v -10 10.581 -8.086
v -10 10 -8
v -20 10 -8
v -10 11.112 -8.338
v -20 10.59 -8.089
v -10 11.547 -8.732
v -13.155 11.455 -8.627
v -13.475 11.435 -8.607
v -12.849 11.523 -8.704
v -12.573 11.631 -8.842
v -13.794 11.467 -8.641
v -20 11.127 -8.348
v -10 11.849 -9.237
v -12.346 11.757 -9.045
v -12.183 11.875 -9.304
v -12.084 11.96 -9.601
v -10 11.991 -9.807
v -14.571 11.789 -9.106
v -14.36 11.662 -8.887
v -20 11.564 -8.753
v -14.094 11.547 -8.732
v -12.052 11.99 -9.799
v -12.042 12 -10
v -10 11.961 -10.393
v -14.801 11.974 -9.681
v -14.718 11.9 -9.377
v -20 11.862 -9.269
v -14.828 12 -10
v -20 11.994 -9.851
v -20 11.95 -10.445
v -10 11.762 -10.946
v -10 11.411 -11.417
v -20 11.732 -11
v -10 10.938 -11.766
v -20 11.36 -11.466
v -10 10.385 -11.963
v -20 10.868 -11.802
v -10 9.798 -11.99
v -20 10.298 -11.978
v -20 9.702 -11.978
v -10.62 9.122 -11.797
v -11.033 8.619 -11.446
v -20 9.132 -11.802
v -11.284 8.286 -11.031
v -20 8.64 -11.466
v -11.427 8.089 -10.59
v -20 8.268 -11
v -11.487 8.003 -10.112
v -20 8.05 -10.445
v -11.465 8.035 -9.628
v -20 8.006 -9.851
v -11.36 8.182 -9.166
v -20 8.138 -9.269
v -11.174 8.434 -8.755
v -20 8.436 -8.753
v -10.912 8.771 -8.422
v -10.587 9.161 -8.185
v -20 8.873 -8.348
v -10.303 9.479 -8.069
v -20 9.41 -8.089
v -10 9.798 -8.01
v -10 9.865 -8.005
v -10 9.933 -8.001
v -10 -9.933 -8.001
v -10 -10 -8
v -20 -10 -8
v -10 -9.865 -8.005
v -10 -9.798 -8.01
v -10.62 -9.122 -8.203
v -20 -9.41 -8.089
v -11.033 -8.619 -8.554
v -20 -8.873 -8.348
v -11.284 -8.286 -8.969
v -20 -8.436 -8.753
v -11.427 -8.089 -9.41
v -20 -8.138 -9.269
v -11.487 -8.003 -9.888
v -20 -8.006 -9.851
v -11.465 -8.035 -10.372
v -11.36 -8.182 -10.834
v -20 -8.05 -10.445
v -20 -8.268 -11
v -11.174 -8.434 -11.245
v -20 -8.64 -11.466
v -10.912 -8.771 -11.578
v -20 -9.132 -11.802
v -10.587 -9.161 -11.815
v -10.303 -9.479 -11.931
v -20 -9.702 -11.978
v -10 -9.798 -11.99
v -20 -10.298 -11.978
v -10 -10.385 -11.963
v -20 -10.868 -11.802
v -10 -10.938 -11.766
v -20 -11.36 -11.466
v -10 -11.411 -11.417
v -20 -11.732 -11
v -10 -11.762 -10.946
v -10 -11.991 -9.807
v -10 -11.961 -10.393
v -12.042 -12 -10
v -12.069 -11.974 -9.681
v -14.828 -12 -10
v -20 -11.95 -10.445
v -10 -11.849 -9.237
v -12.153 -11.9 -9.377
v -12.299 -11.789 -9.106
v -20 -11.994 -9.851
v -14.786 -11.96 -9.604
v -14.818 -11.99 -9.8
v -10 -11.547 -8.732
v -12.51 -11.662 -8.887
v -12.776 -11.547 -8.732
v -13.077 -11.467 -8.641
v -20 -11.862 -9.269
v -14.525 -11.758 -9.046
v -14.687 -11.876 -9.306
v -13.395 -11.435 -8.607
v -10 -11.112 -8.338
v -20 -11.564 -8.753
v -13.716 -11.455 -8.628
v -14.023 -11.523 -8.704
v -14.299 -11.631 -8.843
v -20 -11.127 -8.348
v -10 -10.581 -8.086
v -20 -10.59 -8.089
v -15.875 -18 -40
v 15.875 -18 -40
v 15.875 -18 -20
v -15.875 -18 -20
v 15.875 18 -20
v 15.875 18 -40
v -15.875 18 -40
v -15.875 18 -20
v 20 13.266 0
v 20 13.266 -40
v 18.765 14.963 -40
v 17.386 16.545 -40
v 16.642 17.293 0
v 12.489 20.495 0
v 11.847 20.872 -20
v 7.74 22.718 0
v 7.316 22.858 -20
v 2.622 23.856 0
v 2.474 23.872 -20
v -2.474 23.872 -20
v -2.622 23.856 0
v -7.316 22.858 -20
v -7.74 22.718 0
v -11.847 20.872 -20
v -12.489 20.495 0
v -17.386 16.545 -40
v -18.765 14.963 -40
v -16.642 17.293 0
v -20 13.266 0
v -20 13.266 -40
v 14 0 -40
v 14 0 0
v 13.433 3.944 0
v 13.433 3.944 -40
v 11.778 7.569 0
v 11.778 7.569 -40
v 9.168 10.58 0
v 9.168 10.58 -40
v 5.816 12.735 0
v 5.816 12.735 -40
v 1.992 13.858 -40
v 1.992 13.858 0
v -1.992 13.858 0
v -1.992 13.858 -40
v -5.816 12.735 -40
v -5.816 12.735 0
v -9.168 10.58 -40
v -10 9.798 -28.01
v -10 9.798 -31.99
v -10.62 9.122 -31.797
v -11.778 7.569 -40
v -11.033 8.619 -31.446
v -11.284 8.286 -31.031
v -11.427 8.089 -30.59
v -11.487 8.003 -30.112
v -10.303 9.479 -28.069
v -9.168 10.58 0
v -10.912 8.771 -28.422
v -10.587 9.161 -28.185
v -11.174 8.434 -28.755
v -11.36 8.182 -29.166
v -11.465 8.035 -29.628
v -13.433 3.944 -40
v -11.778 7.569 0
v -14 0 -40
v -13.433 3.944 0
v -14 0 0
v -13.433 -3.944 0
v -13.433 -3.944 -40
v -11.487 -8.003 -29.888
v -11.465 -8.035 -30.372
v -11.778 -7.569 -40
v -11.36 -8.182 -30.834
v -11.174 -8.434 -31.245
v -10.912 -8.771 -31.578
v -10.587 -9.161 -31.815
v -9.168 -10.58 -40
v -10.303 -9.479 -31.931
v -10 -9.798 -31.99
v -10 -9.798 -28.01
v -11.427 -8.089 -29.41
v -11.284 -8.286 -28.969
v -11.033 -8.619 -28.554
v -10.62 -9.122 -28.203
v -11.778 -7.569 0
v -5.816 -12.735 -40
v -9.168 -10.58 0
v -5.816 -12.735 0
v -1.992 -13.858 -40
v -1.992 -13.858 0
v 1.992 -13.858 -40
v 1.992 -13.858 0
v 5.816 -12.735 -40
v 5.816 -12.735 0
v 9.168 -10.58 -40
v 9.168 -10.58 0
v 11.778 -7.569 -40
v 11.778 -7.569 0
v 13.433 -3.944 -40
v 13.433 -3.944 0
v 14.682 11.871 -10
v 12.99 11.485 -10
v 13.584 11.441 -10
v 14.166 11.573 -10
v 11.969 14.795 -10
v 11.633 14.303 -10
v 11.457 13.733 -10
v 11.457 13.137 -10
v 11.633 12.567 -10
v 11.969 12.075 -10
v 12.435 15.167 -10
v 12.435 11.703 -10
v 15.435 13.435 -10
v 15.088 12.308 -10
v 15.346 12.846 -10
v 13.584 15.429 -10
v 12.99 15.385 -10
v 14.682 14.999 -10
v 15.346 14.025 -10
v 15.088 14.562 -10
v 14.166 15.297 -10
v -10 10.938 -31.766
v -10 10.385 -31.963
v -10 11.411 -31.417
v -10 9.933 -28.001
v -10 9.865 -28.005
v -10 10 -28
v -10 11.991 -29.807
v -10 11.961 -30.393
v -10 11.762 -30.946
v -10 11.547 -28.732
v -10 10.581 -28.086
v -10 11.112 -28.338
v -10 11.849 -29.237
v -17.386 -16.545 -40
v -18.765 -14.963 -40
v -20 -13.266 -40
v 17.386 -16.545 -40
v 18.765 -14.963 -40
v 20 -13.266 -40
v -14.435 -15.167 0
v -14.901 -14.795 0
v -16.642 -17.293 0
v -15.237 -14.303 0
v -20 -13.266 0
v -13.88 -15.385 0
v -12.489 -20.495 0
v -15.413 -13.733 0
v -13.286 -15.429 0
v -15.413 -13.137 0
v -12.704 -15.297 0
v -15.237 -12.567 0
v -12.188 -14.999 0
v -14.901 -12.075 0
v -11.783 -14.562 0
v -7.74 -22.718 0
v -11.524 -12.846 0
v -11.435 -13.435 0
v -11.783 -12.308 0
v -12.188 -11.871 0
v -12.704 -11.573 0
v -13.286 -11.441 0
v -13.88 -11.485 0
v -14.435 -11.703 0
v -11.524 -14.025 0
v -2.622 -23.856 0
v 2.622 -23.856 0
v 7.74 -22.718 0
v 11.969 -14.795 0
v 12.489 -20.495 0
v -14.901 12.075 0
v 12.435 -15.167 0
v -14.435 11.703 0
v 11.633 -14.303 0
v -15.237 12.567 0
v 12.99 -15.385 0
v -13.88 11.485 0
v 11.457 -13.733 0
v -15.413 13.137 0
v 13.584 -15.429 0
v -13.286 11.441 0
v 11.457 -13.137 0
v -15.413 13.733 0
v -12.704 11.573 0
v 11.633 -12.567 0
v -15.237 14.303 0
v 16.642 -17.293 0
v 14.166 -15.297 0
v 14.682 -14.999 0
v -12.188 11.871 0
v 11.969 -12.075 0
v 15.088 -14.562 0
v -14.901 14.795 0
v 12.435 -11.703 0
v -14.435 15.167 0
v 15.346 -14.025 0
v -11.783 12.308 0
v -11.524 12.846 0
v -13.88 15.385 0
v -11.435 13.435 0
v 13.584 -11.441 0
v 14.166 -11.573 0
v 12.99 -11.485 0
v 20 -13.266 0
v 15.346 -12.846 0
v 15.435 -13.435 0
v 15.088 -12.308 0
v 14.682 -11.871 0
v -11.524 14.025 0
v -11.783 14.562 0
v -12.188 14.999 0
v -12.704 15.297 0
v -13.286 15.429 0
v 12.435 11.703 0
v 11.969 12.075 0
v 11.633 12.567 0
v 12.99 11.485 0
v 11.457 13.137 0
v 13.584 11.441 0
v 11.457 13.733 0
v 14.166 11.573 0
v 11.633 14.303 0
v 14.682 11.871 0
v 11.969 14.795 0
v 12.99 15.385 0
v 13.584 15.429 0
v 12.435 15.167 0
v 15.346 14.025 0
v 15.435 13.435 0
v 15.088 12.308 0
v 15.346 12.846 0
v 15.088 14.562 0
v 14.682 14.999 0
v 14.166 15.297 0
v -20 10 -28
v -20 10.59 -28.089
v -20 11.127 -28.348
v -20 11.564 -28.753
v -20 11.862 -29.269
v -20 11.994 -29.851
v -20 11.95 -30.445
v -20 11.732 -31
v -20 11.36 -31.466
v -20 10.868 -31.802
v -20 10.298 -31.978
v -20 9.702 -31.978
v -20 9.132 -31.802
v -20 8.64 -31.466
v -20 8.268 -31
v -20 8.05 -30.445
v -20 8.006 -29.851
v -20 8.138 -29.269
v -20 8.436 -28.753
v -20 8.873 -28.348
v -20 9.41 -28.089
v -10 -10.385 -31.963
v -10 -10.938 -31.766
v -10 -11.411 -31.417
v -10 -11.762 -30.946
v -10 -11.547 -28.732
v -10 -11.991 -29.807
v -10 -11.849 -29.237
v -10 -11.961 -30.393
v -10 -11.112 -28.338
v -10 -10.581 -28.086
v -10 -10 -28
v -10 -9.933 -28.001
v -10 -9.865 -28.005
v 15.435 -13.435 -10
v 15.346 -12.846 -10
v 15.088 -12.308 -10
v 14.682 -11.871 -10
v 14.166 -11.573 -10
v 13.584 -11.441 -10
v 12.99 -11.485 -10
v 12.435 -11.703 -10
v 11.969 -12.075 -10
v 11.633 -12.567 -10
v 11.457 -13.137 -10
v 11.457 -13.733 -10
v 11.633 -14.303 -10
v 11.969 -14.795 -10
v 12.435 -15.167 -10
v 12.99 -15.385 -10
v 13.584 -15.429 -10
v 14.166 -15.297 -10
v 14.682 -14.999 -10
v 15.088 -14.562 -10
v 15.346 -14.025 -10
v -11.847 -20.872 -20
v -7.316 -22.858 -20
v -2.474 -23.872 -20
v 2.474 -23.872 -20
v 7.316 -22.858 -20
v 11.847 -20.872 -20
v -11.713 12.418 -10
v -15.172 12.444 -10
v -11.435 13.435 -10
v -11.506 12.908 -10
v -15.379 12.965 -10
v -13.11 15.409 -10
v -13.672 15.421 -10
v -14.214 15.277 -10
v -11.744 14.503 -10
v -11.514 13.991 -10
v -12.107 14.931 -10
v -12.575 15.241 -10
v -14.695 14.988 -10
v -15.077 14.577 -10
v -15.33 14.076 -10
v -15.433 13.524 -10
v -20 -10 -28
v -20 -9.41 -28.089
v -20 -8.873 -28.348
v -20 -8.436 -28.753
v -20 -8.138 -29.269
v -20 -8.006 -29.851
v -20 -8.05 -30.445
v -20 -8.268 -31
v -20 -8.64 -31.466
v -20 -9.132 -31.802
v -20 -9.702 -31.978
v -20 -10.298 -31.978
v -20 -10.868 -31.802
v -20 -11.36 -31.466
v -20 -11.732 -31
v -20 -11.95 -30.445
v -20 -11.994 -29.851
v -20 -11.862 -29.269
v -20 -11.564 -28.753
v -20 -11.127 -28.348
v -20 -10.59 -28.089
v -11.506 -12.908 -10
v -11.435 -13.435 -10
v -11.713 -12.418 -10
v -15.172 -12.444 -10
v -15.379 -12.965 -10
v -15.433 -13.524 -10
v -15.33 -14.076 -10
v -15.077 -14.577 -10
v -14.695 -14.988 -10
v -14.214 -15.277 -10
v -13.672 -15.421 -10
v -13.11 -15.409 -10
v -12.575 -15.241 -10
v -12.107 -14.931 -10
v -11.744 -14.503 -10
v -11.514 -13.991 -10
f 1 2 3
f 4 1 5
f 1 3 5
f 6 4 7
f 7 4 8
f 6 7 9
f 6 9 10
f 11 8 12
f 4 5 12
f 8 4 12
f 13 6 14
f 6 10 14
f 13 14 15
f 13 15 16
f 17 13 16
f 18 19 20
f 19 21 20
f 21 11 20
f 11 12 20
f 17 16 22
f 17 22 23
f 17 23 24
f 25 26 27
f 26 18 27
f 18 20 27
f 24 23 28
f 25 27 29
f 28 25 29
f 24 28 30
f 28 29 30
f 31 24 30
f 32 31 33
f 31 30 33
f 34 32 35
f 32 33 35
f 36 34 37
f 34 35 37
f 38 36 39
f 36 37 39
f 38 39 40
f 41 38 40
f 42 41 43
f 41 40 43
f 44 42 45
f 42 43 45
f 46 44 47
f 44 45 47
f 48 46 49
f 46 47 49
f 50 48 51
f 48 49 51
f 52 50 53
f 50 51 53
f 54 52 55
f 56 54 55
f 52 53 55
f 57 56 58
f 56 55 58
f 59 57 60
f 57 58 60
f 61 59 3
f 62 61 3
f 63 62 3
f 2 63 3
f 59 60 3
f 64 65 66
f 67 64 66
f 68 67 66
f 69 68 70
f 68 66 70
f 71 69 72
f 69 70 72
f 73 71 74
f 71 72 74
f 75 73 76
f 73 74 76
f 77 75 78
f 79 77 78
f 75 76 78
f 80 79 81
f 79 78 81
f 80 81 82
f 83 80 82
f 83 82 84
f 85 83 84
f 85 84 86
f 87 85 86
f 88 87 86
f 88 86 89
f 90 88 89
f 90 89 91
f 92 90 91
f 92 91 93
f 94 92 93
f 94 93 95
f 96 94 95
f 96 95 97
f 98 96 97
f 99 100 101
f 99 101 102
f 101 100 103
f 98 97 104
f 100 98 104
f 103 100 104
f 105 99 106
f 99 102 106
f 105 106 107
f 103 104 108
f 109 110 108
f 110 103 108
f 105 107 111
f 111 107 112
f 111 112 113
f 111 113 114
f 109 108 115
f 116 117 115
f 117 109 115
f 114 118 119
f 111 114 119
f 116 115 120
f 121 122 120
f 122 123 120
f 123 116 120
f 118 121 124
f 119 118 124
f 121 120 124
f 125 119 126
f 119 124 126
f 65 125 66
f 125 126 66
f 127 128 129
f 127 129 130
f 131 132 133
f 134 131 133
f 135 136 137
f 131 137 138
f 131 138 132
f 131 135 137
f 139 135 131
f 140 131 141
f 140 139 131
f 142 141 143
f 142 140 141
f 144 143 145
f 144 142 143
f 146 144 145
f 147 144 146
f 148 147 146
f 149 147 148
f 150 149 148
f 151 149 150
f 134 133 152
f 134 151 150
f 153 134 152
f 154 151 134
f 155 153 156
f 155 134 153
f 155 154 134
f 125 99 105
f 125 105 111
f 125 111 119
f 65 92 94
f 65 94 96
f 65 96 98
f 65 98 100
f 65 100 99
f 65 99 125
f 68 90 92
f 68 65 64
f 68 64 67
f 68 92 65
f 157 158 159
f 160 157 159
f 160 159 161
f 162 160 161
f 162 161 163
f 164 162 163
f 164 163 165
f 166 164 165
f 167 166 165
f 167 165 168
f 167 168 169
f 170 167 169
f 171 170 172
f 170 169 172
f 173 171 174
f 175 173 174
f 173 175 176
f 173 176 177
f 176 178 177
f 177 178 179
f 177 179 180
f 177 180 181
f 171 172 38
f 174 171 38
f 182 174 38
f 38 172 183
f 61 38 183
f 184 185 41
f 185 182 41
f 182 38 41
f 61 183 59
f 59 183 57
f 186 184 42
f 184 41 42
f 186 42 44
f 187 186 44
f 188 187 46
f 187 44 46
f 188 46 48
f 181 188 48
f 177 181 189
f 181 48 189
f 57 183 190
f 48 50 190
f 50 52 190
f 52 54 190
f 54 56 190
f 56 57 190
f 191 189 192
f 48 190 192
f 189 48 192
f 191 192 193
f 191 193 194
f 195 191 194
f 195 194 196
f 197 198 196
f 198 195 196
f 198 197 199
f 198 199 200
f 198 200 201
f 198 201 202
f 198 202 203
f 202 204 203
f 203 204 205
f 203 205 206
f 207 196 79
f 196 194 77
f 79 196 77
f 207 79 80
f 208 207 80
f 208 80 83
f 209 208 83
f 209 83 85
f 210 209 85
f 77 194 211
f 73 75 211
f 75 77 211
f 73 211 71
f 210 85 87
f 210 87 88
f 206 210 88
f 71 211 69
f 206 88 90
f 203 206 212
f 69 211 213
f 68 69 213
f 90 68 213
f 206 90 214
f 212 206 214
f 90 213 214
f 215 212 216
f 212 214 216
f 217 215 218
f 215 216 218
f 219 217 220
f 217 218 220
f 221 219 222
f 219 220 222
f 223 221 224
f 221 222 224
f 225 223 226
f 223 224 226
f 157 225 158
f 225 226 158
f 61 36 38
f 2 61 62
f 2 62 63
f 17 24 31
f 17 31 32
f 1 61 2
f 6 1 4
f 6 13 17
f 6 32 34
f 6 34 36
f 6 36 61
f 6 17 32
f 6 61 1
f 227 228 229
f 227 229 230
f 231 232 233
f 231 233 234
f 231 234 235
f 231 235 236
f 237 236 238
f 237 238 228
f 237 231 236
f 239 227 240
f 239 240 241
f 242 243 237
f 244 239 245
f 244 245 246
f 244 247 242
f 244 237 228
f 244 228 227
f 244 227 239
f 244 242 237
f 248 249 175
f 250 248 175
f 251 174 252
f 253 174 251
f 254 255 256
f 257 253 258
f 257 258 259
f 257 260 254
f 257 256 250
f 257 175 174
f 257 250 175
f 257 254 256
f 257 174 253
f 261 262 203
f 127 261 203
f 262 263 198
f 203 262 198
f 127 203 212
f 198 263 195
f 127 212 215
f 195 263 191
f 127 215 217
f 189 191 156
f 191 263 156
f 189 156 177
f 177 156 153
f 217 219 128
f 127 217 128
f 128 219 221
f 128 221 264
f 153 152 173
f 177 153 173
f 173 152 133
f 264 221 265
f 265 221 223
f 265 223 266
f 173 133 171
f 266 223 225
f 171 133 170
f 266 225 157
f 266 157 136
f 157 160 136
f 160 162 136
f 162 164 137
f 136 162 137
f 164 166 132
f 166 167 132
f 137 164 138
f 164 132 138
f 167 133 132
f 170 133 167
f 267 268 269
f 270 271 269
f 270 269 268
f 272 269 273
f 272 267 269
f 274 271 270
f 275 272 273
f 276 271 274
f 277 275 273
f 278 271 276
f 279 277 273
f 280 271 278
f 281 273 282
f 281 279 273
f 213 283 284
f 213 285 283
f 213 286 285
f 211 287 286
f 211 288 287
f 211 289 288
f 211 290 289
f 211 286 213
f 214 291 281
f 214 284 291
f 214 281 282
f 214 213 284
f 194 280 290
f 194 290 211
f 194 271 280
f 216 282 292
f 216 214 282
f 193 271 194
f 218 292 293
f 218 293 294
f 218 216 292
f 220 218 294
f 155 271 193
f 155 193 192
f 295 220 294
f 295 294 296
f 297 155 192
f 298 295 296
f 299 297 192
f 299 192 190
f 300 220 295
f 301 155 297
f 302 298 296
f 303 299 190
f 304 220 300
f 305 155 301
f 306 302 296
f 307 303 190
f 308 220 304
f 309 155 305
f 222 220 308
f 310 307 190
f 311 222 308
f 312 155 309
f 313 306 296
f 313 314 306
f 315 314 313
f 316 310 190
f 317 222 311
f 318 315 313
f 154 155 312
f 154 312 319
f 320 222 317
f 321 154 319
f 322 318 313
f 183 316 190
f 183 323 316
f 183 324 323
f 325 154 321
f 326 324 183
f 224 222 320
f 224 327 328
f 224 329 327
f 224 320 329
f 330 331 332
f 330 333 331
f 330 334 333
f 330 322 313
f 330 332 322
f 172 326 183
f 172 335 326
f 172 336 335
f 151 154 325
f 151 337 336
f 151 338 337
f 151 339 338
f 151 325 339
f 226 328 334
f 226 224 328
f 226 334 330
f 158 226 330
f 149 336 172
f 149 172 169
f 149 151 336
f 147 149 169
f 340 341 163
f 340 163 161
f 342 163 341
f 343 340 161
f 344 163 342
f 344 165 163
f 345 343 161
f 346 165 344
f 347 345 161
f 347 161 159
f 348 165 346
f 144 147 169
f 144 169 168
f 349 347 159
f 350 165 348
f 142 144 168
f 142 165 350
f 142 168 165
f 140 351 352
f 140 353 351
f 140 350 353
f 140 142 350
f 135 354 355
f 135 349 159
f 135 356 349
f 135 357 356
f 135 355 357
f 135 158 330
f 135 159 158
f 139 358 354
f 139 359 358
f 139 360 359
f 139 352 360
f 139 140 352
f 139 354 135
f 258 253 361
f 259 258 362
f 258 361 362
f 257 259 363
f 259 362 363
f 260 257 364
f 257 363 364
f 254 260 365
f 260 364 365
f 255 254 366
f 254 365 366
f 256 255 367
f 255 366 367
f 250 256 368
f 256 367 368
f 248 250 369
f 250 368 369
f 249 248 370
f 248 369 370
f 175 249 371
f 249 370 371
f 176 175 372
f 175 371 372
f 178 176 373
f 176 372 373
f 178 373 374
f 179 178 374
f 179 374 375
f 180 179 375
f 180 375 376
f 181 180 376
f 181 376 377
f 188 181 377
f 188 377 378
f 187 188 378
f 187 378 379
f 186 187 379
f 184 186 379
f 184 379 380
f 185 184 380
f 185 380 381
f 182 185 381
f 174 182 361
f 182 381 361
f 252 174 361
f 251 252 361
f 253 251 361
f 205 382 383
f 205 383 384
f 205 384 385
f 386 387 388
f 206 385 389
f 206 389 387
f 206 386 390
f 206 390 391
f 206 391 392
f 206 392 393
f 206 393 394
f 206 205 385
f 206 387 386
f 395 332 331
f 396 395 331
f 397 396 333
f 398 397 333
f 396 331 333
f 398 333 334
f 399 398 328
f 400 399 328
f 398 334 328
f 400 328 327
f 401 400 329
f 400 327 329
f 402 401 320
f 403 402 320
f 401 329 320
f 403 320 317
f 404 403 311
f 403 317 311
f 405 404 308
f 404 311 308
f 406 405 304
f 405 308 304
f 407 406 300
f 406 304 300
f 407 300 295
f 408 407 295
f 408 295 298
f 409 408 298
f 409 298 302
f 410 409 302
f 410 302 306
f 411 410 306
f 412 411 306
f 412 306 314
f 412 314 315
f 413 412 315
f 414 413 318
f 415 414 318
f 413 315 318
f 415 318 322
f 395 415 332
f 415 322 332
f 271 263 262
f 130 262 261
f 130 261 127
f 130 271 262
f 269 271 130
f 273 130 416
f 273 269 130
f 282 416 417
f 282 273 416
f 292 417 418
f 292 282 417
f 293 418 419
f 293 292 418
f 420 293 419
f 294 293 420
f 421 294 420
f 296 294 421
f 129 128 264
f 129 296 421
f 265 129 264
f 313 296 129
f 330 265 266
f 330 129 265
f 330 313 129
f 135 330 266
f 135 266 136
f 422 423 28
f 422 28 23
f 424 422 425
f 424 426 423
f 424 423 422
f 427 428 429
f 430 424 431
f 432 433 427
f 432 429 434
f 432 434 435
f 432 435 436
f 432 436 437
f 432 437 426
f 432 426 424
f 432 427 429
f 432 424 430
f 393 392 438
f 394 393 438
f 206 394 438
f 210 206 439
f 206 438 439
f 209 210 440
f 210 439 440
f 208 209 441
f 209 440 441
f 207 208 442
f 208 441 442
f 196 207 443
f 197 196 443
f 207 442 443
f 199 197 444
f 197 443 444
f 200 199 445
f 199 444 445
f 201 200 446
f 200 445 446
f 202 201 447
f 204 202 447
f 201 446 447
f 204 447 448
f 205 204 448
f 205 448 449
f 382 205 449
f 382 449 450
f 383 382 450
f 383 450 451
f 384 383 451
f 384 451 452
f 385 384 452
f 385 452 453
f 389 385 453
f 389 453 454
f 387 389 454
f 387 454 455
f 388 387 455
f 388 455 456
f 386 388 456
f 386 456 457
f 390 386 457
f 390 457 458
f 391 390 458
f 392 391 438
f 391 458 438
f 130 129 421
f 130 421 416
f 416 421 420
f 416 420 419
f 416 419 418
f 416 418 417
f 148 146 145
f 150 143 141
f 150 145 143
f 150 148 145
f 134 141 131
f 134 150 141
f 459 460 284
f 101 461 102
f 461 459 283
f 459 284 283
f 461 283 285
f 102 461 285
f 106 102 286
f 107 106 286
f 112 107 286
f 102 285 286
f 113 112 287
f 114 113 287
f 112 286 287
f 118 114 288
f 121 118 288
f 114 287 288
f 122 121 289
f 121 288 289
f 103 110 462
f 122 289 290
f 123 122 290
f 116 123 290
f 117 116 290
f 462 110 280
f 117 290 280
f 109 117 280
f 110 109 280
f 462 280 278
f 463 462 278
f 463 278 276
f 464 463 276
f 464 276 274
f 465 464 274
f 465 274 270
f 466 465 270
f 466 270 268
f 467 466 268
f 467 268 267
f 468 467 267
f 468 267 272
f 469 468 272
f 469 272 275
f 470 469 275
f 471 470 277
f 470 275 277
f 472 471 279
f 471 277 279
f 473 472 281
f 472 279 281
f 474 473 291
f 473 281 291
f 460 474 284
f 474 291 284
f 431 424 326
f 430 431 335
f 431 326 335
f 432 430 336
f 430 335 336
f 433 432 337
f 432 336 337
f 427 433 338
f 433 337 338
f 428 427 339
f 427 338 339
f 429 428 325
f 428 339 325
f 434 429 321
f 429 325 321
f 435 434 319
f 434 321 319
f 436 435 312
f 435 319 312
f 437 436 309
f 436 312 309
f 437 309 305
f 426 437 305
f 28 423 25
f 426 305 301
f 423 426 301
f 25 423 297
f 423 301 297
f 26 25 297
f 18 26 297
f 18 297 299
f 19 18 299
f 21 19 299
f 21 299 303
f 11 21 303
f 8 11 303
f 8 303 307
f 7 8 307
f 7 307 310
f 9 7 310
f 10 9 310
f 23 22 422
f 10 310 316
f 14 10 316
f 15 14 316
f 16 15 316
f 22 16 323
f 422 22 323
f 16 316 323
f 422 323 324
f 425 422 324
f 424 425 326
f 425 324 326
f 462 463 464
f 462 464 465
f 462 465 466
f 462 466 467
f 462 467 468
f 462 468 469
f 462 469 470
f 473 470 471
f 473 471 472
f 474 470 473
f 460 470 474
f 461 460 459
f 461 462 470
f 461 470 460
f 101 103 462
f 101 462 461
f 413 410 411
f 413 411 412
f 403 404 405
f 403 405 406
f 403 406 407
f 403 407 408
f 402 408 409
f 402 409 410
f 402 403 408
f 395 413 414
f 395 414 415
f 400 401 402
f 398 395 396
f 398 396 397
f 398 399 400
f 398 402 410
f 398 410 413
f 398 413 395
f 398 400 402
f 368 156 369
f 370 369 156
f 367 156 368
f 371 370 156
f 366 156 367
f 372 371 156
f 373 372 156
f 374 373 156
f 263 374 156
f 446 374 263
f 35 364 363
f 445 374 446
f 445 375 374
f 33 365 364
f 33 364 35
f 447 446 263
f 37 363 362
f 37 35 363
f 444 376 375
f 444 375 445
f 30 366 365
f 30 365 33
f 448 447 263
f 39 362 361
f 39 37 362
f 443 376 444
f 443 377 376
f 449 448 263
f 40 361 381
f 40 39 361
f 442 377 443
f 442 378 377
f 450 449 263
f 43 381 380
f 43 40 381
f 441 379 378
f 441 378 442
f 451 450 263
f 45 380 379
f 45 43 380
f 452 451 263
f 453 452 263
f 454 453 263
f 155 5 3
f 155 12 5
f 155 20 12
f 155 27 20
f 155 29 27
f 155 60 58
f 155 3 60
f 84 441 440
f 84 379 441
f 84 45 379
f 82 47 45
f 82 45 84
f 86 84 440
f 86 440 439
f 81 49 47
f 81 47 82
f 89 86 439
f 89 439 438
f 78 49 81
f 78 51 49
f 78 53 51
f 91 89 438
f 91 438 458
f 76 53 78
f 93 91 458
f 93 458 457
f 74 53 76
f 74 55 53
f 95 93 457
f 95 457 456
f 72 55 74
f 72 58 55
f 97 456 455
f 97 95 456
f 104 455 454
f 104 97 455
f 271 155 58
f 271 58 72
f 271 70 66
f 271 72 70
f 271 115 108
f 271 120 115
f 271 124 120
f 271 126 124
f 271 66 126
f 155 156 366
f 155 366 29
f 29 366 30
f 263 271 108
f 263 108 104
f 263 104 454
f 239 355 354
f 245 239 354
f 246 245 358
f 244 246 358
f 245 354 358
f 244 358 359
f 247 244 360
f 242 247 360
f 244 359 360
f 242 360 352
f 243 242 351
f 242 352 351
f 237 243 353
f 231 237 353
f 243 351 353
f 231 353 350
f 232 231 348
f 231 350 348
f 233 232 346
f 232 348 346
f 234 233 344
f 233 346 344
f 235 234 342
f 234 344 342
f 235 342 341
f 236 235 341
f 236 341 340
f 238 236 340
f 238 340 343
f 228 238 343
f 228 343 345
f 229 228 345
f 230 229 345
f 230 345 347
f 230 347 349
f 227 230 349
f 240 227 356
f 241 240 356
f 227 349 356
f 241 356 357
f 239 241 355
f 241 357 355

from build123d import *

# Parameters (mm, degrees)
SCHIZZO1_R                   = 14
ESTRUSIONE_ESTRUSIONE1_DEPTH = 40
SCHIZZO4_R                   = 2
TAGLIO_ESTRUSIONE1_DEPTH     = 10
SCHIZZO5_R                   = 2
TAGLIO_ESTRUSIONE2_DEPTH     = 10
SCHIZZO6_W                   = 32.003306677
SCHIZZO6_H                   = 7.880991961
TAGLIO_ESTRUSIONE3_DEPTH     = 20


with BuildPart() as part:
    # Schizzo1 → Estrusione-Estrusione1 (new body)
    with BuildSketch(Plane.XY):
        with BuildLine():
            Line((20, -13.266499161), (20, 13.266499161))
            ThreePointArc((20, 13.266499161), (0, 24), (-20, 13.266499161))
            Line((-20, 13.266499161), (-20, -13.266499161))
            ThreePointArc((-20, -13.266499161), (0, -24), (20, -13.266499161))
        make_face()
        Circle(SCHIZZO1_R, mode=Mode.SUBTRACT)
    extrude(amount=-ESTRUSIONE_ESTRUSIONE1_DEPTH)

    # Schizzo4 → Taglio-Estrusione1 (cut)
    with BuildSketch(Plane.ZY.offset(20)):
        with Locations((-10, 10)):
            Circle(SCHIZZO4_R)
        with Locations((-10, -10)):
            Circle(SCHIZZO4_R)
        with Locations((-30, -10)):
            Circle(SCHIZZO4_R)
        with Locations((-30, 10)):
            Circle(SCHIZZO4_R)
    extrude(amount=-TAGLIO_ESTRUSIONE1_DEPTH, mode=Mode.SUBTRACT)

    # Schizzo5 → Taglio-Estrusione2 (cut)
    with BuildSketch(Plane.XY):
        with Locations((-13.435028843, 13.435028843)):
            Circle(SCHIZZO5_R)
        with Locations((13.435028843, 13.435028843)):
            Circle(SCHIZZO5_R)
        with Locations((13.435028843, -13.435028843)):
            Circle(SCHIZZO5_R)
        with Locations((-13.435028843, -13.435028843)):
            Circle(SCHIZZO5_R)
    extrude(amount=-TAGLIO_ESTRUSIONE2_DEPTH, mode=Mode.SUBTRACT)

    # Schizzo6 → Taglio-Estrusione3 (cut)
    with BuildSketch(Plane(origin=(0, 0, -40), x_dir=(-1, 0, 0), z_dir=(0, 0, -1))):
        with Locations((0.127145472, 21.940495981)):
            Rectangle(SCHIZZO6_W, SCHIZZO6_H)
        with Locations((0.127145472, -21.940495981)):
            Rectangle(SCHIZZO6_W, SCHIZZO6_H)
    extrude(amount=-TAGLIO_ESTRUSIONE3_DEPTH, mode=Mode.SUBTRACT)


solid = part.part
